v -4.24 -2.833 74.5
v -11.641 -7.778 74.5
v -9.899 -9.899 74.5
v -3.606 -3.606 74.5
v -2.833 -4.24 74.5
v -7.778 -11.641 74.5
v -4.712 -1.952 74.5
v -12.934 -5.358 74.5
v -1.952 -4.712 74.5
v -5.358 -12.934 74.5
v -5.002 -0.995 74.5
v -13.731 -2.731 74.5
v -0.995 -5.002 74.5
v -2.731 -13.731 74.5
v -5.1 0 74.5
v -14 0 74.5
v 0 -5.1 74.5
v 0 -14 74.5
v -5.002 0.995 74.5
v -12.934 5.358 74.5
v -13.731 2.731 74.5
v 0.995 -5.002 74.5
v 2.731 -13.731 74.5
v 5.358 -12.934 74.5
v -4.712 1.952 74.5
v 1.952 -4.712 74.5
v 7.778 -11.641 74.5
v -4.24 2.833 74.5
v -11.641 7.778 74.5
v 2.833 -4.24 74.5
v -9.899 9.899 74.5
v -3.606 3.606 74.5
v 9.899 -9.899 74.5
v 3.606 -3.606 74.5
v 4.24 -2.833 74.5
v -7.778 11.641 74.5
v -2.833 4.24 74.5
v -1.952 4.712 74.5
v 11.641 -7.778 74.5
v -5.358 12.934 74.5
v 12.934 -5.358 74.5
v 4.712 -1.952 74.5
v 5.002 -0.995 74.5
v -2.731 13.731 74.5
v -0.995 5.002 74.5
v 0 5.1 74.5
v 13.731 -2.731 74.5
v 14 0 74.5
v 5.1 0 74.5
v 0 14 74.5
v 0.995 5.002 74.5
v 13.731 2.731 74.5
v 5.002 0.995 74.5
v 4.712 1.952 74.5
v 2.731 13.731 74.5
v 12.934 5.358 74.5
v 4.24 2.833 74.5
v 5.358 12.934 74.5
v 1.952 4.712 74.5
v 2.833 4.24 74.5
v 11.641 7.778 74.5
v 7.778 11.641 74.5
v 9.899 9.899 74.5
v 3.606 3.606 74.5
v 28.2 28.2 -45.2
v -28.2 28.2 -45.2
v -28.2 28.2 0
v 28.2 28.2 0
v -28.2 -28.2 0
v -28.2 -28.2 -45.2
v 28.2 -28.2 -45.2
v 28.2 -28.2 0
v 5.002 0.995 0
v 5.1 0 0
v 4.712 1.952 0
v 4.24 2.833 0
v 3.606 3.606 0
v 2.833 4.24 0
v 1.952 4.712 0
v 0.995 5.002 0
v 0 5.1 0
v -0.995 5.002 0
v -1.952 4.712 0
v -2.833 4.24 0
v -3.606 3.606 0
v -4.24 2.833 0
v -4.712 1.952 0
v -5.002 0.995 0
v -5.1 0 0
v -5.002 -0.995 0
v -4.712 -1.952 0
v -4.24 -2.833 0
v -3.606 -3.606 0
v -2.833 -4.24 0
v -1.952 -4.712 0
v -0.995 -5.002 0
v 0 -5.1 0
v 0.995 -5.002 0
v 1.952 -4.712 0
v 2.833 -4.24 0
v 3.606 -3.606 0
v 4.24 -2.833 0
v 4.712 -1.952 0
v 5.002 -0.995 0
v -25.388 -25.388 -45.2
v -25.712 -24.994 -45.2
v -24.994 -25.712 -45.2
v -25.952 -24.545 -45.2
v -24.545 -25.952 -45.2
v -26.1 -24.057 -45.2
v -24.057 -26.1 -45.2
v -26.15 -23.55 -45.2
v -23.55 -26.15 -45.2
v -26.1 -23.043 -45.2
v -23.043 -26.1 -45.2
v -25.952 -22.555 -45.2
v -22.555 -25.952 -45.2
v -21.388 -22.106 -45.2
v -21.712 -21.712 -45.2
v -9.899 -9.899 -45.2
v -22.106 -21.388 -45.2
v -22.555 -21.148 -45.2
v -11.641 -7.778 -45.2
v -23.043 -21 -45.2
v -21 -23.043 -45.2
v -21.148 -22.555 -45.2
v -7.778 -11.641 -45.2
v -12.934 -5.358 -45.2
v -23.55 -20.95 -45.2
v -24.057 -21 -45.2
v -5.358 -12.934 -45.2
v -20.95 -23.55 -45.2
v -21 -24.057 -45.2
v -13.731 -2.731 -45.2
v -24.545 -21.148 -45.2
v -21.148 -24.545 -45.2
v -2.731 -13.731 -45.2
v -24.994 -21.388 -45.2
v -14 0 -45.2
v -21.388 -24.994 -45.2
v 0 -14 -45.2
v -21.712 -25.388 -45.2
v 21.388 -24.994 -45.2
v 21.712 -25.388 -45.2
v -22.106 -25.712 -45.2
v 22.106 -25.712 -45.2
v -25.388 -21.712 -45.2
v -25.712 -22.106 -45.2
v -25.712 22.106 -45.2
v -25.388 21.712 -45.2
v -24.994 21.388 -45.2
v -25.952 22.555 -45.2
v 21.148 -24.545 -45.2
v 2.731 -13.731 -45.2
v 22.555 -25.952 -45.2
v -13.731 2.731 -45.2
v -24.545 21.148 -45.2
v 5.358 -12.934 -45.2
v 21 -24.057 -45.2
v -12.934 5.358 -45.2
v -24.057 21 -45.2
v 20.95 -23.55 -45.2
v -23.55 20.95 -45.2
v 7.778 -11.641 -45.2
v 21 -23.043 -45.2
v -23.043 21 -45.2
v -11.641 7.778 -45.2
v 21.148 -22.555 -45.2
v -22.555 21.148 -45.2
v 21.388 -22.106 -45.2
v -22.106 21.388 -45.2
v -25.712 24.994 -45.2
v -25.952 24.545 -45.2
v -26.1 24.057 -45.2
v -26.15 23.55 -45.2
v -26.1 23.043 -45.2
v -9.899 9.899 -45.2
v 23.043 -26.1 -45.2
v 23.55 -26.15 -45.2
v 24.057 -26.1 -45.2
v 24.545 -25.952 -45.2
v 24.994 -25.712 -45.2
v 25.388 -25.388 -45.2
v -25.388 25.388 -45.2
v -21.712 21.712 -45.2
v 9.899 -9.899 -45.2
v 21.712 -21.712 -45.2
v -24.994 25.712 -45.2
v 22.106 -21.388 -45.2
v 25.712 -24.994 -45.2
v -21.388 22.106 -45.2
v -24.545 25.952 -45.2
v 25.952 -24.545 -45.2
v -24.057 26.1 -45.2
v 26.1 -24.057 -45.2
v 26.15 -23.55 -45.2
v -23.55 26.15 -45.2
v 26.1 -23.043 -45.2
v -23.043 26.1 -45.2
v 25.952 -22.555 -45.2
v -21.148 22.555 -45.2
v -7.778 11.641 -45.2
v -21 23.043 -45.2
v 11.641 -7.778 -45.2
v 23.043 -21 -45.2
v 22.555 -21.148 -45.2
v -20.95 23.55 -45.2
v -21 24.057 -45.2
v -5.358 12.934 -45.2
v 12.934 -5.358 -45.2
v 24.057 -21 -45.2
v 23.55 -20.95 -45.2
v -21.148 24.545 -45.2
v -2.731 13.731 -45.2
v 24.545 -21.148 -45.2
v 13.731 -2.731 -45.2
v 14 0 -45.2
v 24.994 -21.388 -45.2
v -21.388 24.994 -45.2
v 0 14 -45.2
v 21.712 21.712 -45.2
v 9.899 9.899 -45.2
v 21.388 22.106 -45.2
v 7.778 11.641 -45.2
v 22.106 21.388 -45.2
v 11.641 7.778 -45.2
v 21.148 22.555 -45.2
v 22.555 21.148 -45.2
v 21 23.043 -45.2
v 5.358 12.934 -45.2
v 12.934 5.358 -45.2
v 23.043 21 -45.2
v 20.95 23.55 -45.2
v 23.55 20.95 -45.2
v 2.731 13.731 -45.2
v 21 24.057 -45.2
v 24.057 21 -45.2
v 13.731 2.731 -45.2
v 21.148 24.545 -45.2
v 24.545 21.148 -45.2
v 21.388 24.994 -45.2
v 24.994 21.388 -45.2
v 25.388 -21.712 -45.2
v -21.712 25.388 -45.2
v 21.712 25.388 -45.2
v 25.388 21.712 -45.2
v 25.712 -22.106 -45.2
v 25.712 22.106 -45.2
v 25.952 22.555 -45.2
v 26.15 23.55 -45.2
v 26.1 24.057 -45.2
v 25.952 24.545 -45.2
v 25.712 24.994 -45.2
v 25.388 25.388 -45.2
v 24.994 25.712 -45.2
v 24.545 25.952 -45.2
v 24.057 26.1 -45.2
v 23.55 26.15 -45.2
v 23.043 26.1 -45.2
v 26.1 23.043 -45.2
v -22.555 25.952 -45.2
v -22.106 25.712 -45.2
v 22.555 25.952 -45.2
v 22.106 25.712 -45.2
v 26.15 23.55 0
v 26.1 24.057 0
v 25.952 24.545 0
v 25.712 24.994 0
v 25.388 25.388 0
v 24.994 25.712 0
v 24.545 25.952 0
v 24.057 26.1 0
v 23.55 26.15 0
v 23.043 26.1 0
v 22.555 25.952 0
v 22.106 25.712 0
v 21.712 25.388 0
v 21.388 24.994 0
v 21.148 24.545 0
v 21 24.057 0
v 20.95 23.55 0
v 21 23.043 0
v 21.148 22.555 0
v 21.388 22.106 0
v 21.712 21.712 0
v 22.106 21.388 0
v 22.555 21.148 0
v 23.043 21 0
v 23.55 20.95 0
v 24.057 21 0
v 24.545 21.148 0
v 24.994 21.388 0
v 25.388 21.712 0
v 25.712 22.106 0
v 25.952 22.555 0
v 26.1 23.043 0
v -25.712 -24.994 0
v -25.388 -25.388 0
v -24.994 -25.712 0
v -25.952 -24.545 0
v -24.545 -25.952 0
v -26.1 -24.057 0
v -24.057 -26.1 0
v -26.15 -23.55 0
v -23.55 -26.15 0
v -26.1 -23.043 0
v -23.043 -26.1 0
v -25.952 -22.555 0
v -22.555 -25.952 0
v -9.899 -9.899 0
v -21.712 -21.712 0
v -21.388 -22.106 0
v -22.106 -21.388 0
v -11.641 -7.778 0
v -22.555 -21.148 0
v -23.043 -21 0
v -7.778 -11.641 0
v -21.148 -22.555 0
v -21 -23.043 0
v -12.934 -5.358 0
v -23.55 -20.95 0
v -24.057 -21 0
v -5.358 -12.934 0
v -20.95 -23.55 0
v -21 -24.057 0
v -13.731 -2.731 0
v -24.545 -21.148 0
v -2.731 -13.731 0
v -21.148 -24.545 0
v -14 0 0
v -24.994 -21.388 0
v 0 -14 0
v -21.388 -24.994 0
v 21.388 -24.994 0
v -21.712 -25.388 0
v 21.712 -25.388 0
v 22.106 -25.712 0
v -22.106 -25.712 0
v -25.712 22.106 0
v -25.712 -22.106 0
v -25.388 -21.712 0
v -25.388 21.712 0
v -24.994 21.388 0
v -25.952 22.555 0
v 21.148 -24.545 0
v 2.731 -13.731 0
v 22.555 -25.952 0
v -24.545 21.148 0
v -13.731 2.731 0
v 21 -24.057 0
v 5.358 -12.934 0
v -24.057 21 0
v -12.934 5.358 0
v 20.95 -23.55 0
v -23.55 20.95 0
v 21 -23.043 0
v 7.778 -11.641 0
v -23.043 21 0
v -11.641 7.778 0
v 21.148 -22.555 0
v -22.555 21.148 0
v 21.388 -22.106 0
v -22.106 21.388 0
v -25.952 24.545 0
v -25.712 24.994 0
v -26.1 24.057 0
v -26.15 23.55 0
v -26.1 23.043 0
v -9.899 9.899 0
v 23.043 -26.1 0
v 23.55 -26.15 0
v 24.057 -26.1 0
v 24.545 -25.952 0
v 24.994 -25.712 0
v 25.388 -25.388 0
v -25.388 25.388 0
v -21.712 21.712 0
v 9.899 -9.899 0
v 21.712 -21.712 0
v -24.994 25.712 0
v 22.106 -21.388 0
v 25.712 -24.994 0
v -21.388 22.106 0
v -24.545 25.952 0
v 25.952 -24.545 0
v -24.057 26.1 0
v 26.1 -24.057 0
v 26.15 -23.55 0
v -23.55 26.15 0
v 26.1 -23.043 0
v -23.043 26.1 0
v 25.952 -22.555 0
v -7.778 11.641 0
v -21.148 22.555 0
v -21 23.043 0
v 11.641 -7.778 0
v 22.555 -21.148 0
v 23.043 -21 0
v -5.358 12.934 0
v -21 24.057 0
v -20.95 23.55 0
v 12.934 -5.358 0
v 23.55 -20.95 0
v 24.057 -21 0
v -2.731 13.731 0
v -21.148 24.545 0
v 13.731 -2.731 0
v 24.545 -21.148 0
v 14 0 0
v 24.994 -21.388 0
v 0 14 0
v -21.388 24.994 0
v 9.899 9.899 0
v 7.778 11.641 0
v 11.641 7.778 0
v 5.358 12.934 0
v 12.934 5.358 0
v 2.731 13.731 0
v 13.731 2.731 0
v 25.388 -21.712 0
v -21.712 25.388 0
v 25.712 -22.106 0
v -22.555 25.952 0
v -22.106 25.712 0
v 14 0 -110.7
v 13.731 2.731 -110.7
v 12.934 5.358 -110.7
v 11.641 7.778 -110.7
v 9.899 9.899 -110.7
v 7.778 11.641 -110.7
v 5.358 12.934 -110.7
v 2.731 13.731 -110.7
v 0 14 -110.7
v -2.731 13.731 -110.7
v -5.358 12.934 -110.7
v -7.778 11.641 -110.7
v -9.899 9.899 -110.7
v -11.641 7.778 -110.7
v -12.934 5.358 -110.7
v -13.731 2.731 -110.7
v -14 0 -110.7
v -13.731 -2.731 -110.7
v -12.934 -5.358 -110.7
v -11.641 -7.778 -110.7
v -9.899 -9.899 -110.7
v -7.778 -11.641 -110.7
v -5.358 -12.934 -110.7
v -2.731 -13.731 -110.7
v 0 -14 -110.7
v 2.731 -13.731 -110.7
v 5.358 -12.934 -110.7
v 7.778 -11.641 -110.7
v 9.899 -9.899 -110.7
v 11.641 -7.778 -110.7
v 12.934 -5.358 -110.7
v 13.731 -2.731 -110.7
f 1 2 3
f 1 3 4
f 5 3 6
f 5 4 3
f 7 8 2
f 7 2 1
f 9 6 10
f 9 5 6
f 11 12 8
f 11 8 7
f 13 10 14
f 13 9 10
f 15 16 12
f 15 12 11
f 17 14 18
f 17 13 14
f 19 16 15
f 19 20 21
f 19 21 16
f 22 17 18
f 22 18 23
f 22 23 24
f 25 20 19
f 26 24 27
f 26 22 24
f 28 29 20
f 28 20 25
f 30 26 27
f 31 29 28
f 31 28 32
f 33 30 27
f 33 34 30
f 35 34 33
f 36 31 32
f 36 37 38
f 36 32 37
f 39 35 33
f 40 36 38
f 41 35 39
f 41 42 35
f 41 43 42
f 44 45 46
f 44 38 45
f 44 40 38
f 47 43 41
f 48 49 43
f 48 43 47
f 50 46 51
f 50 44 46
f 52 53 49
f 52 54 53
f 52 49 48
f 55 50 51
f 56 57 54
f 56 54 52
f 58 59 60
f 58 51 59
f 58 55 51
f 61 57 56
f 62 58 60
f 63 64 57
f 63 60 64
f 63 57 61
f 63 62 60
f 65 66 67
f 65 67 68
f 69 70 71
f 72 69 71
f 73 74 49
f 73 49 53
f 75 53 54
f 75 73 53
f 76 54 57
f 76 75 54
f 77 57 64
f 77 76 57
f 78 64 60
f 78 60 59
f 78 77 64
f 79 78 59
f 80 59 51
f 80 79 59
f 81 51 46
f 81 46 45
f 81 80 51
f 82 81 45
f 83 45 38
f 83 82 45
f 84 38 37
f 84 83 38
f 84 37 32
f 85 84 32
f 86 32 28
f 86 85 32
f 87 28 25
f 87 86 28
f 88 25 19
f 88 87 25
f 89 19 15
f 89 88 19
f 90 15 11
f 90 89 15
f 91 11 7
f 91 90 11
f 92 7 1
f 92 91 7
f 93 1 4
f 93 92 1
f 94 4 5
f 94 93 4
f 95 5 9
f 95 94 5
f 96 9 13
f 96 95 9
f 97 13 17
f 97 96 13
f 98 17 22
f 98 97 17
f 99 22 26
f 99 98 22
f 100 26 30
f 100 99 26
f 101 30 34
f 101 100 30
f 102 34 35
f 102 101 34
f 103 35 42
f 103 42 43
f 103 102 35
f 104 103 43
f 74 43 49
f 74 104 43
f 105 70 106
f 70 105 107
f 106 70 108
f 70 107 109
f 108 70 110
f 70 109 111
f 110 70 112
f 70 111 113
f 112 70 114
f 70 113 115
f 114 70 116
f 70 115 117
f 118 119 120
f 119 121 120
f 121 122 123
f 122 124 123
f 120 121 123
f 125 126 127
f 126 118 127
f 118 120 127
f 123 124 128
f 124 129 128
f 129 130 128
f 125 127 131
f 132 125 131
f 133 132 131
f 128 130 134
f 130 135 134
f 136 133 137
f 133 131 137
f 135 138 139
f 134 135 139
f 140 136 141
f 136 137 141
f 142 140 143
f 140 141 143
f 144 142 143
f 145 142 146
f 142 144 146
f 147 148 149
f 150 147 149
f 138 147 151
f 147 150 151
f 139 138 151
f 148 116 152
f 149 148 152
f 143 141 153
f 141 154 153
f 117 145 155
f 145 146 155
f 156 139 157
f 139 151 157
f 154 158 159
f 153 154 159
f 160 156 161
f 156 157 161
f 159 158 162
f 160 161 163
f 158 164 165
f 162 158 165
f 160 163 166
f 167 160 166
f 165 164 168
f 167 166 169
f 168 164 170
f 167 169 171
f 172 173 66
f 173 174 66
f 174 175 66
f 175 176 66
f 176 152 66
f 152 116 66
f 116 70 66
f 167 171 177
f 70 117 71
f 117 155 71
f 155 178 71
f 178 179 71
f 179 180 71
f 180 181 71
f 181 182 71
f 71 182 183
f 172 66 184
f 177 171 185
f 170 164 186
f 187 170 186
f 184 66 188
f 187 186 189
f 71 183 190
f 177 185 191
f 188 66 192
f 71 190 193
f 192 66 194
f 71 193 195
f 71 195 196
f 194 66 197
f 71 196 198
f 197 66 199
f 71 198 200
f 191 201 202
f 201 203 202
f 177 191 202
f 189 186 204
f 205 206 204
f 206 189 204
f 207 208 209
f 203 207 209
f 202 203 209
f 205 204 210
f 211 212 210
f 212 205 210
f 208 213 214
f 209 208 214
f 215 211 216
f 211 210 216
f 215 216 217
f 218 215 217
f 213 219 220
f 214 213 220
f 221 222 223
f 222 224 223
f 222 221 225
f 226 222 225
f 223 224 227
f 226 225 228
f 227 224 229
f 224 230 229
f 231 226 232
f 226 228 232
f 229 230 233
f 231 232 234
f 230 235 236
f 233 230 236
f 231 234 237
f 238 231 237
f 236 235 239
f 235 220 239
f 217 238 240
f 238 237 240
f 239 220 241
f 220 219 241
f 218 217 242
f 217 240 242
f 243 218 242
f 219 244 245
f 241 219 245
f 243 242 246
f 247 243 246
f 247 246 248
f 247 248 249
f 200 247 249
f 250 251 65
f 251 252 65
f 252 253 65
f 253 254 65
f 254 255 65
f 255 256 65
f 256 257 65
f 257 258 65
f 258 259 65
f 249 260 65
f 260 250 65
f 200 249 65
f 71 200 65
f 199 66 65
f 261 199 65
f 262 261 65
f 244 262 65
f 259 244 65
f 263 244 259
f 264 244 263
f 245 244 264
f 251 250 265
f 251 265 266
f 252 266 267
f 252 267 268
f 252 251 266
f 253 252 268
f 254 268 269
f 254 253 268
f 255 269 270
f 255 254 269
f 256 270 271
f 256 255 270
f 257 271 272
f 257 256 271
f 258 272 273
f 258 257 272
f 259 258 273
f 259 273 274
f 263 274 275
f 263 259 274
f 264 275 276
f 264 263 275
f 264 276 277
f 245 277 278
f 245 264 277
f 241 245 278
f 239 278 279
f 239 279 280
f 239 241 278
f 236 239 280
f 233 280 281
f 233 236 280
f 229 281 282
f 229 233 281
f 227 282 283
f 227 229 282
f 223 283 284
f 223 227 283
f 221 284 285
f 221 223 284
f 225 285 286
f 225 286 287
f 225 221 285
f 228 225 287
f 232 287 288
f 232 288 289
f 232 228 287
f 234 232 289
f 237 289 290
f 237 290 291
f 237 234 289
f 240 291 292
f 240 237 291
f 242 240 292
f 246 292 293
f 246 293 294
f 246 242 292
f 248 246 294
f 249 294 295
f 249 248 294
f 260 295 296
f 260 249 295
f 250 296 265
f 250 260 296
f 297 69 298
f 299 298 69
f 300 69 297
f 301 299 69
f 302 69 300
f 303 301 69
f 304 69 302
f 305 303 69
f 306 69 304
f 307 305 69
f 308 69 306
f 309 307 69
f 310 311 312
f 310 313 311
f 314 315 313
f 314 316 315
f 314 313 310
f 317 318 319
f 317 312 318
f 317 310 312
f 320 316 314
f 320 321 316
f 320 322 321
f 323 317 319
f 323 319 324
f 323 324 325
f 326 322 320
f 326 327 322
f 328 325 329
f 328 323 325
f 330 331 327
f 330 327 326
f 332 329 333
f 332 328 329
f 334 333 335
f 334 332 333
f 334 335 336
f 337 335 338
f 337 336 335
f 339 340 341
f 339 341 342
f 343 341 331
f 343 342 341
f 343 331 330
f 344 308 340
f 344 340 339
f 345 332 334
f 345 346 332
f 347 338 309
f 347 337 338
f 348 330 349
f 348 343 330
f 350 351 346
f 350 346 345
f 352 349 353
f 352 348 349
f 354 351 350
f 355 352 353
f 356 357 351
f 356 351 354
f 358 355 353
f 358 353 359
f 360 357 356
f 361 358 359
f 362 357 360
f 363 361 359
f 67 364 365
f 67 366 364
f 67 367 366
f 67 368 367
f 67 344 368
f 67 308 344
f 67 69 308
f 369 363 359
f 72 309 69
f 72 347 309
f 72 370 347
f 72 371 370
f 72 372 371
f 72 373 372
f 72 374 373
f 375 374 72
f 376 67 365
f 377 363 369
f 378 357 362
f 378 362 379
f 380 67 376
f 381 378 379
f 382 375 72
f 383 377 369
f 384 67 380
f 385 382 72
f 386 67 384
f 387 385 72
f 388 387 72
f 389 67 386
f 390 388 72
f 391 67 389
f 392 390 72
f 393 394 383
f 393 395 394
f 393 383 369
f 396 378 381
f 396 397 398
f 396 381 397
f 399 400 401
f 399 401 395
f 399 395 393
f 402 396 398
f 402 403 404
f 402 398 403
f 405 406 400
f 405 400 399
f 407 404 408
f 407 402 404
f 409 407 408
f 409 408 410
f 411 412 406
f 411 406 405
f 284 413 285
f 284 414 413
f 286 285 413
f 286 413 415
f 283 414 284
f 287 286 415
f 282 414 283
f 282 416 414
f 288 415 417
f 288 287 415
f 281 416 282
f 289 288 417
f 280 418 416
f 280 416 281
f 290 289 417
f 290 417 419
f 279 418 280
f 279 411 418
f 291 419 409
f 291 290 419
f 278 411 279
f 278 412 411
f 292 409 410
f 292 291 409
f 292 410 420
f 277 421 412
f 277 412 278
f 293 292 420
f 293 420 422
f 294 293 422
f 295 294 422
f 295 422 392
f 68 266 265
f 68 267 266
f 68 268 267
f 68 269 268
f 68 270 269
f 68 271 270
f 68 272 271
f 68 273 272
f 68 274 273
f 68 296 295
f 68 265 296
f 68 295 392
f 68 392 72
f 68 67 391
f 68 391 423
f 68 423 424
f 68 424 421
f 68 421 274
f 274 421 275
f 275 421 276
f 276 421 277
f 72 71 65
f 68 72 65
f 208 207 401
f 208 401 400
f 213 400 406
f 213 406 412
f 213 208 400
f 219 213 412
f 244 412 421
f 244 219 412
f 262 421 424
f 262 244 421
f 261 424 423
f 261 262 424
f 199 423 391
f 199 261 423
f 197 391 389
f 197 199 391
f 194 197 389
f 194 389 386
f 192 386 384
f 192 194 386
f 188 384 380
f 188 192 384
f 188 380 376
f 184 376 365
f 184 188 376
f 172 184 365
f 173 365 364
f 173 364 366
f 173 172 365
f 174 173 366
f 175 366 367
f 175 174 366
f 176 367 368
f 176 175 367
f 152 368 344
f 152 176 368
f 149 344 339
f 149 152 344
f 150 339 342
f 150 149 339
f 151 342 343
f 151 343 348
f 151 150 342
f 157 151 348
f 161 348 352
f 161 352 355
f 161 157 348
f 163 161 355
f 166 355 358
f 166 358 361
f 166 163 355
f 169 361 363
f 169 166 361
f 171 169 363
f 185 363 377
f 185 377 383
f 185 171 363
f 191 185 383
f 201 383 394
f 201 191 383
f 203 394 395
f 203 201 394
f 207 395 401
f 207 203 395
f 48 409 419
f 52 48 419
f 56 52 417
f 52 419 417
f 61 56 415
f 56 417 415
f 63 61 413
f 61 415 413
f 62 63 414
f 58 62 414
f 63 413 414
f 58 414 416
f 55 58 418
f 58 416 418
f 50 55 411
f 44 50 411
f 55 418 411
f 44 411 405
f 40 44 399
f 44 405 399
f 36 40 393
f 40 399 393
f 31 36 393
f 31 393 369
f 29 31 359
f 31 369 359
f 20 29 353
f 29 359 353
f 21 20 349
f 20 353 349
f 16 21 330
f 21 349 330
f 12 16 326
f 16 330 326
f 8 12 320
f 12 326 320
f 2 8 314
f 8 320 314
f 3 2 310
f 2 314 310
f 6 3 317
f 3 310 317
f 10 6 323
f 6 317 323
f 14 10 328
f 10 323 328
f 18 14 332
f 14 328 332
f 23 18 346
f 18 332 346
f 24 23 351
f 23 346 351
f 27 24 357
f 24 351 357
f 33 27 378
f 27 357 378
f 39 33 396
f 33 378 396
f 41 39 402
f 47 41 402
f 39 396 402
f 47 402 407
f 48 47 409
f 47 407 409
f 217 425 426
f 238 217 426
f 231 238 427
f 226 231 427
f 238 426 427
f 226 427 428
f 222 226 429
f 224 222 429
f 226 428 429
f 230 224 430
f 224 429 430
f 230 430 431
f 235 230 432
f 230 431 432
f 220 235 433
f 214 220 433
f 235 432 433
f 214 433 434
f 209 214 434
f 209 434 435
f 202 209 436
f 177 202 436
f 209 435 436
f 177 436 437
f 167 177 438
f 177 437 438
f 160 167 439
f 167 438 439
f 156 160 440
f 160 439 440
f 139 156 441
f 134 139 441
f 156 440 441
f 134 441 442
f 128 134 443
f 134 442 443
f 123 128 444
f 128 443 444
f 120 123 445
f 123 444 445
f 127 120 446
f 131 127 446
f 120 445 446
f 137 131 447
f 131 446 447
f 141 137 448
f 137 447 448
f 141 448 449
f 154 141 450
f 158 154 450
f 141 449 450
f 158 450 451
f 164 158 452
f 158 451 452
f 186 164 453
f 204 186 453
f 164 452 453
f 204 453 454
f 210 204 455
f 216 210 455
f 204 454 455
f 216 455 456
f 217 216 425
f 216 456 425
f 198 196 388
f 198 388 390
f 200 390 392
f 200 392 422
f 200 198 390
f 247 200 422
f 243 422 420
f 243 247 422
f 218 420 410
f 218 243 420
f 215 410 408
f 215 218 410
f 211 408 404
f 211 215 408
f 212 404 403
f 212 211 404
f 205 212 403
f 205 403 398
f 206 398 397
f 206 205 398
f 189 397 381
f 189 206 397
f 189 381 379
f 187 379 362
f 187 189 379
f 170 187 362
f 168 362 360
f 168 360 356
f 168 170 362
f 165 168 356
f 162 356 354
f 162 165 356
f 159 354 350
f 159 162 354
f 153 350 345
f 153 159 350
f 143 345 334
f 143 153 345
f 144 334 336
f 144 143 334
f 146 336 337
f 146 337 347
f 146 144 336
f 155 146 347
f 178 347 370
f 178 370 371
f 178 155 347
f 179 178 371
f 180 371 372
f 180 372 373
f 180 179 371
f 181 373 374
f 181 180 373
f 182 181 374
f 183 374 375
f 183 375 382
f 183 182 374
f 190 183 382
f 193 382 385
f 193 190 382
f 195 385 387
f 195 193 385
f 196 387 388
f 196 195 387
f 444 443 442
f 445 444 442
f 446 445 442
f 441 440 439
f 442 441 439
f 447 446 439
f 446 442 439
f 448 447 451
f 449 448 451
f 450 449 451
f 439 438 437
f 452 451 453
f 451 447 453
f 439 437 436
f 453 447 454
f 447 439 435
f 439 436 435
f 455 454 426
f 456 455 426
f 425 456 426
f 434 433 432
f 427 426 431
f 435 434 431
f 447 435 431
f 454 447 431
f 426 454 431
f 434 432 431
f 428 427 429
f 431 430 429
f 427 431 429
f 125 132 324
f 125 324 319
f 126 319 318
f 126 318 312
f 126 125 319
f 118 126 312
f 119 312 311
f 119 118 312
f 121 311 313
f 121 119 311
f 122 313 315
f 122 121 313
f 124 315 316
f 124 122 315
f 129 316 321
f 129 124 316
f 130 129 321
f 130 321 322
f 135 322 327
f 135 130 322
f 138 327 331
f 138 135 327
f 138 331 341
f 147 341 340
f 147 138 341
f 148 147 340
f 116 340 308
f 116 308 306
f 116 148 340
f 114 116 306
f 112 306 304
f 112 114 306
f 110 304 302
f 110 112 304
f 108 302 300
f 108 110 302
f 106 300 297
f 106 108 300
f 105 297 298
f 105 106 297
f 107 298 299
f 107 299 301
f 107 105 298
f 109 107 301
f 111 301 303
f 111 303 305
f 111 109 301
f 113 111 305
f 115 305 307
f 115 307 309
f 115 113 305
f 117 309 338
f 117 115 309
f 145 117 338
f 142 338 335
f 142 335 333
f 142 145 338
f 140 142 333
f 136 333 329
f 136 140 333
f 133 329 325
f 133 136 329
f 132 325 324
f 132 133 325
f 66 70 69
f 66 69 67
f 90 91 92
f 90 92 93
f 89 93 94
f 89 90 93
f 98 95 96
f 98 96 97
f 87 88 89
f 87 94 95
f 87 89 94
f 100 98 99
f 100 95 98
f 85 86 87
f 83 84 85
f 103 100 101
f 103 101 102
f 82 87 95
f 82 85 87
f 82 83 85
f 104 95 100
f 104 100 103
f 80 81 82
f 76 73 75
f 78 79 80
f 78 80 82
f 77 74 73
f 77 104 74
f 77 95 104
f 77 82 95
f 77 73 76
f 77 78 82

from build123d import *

# Parameters (mm, degrees)
NA23_MOTOR_ENVELOPE_START         = -45.2
SKETCH1_W                         = 56.4
SKETCH1_H                         = 56.4
SKETCH1_R                         = 2.6
NA23_MOTOR_ENVELOPE_DEPTH         = 45.2
REAR_BARREL_ENVELOPE_START        = -110.7
SKETCH2_R                         = 14
REAR_BARREL_ENVELOPE_DEPTH        = 65.5
SKETCH3_R                         = 14
SKETCH3_R_2                       = 5.1
FIXED_FRONT_BARREL_ENVELOPE_DEPTH = 74.5


with BuildPart() as part:
    # Sketch1 → NA23_Motor_Envelope (new body)
    with BuildSketch(Plane.XY.offset(NA23_MOTOR_ENVELOPE_START)):
        Rectangle(SKETCH1_W, SKETCH1_H)
        with Locations((-23.55, -23.55)):
            Circle(SKETCH1_R, mode=Mode.SUBTRACT)
        with Locations((-23.55, 23.55)):
            Circle(SKETCH1_R, mode=Mode.SUBTRACT)
        with Locations((23.55, -23.55)):
            Circle(SKETCH1_R, mode=Mode.SUBTRACT)
        with Locations((23.55, 23.55)):
            Circle(SKETCH1_R, mode=Mode.SUBTRACT)
    extrude(amount=NA23_MOTOR_ENVELOPE_DEPTH)

    # Sketch2 → Rear_Barrel_Envelope (add)
    with BuildSketch(Plane.XY.offset(REAR_BARREL_ENVELOPE_START)):
        Circle(SKETCH2_R)
    extrude(amount=REAR_BARREL_ENVELOPE_DEPTH)

    # Sketch3 → Fixed_Front_Barrel_Envelope (add)
    with BuildSketch(Plane.XY):
        Circle(SKETCH3_R)
        Circle(SKETCH3_R_2, mode=Mode.SUBTRACT)
    extrude(amount=FIXED_FRONT_BARREL_ENVELOPE_DEPTH)


solid = part.part
